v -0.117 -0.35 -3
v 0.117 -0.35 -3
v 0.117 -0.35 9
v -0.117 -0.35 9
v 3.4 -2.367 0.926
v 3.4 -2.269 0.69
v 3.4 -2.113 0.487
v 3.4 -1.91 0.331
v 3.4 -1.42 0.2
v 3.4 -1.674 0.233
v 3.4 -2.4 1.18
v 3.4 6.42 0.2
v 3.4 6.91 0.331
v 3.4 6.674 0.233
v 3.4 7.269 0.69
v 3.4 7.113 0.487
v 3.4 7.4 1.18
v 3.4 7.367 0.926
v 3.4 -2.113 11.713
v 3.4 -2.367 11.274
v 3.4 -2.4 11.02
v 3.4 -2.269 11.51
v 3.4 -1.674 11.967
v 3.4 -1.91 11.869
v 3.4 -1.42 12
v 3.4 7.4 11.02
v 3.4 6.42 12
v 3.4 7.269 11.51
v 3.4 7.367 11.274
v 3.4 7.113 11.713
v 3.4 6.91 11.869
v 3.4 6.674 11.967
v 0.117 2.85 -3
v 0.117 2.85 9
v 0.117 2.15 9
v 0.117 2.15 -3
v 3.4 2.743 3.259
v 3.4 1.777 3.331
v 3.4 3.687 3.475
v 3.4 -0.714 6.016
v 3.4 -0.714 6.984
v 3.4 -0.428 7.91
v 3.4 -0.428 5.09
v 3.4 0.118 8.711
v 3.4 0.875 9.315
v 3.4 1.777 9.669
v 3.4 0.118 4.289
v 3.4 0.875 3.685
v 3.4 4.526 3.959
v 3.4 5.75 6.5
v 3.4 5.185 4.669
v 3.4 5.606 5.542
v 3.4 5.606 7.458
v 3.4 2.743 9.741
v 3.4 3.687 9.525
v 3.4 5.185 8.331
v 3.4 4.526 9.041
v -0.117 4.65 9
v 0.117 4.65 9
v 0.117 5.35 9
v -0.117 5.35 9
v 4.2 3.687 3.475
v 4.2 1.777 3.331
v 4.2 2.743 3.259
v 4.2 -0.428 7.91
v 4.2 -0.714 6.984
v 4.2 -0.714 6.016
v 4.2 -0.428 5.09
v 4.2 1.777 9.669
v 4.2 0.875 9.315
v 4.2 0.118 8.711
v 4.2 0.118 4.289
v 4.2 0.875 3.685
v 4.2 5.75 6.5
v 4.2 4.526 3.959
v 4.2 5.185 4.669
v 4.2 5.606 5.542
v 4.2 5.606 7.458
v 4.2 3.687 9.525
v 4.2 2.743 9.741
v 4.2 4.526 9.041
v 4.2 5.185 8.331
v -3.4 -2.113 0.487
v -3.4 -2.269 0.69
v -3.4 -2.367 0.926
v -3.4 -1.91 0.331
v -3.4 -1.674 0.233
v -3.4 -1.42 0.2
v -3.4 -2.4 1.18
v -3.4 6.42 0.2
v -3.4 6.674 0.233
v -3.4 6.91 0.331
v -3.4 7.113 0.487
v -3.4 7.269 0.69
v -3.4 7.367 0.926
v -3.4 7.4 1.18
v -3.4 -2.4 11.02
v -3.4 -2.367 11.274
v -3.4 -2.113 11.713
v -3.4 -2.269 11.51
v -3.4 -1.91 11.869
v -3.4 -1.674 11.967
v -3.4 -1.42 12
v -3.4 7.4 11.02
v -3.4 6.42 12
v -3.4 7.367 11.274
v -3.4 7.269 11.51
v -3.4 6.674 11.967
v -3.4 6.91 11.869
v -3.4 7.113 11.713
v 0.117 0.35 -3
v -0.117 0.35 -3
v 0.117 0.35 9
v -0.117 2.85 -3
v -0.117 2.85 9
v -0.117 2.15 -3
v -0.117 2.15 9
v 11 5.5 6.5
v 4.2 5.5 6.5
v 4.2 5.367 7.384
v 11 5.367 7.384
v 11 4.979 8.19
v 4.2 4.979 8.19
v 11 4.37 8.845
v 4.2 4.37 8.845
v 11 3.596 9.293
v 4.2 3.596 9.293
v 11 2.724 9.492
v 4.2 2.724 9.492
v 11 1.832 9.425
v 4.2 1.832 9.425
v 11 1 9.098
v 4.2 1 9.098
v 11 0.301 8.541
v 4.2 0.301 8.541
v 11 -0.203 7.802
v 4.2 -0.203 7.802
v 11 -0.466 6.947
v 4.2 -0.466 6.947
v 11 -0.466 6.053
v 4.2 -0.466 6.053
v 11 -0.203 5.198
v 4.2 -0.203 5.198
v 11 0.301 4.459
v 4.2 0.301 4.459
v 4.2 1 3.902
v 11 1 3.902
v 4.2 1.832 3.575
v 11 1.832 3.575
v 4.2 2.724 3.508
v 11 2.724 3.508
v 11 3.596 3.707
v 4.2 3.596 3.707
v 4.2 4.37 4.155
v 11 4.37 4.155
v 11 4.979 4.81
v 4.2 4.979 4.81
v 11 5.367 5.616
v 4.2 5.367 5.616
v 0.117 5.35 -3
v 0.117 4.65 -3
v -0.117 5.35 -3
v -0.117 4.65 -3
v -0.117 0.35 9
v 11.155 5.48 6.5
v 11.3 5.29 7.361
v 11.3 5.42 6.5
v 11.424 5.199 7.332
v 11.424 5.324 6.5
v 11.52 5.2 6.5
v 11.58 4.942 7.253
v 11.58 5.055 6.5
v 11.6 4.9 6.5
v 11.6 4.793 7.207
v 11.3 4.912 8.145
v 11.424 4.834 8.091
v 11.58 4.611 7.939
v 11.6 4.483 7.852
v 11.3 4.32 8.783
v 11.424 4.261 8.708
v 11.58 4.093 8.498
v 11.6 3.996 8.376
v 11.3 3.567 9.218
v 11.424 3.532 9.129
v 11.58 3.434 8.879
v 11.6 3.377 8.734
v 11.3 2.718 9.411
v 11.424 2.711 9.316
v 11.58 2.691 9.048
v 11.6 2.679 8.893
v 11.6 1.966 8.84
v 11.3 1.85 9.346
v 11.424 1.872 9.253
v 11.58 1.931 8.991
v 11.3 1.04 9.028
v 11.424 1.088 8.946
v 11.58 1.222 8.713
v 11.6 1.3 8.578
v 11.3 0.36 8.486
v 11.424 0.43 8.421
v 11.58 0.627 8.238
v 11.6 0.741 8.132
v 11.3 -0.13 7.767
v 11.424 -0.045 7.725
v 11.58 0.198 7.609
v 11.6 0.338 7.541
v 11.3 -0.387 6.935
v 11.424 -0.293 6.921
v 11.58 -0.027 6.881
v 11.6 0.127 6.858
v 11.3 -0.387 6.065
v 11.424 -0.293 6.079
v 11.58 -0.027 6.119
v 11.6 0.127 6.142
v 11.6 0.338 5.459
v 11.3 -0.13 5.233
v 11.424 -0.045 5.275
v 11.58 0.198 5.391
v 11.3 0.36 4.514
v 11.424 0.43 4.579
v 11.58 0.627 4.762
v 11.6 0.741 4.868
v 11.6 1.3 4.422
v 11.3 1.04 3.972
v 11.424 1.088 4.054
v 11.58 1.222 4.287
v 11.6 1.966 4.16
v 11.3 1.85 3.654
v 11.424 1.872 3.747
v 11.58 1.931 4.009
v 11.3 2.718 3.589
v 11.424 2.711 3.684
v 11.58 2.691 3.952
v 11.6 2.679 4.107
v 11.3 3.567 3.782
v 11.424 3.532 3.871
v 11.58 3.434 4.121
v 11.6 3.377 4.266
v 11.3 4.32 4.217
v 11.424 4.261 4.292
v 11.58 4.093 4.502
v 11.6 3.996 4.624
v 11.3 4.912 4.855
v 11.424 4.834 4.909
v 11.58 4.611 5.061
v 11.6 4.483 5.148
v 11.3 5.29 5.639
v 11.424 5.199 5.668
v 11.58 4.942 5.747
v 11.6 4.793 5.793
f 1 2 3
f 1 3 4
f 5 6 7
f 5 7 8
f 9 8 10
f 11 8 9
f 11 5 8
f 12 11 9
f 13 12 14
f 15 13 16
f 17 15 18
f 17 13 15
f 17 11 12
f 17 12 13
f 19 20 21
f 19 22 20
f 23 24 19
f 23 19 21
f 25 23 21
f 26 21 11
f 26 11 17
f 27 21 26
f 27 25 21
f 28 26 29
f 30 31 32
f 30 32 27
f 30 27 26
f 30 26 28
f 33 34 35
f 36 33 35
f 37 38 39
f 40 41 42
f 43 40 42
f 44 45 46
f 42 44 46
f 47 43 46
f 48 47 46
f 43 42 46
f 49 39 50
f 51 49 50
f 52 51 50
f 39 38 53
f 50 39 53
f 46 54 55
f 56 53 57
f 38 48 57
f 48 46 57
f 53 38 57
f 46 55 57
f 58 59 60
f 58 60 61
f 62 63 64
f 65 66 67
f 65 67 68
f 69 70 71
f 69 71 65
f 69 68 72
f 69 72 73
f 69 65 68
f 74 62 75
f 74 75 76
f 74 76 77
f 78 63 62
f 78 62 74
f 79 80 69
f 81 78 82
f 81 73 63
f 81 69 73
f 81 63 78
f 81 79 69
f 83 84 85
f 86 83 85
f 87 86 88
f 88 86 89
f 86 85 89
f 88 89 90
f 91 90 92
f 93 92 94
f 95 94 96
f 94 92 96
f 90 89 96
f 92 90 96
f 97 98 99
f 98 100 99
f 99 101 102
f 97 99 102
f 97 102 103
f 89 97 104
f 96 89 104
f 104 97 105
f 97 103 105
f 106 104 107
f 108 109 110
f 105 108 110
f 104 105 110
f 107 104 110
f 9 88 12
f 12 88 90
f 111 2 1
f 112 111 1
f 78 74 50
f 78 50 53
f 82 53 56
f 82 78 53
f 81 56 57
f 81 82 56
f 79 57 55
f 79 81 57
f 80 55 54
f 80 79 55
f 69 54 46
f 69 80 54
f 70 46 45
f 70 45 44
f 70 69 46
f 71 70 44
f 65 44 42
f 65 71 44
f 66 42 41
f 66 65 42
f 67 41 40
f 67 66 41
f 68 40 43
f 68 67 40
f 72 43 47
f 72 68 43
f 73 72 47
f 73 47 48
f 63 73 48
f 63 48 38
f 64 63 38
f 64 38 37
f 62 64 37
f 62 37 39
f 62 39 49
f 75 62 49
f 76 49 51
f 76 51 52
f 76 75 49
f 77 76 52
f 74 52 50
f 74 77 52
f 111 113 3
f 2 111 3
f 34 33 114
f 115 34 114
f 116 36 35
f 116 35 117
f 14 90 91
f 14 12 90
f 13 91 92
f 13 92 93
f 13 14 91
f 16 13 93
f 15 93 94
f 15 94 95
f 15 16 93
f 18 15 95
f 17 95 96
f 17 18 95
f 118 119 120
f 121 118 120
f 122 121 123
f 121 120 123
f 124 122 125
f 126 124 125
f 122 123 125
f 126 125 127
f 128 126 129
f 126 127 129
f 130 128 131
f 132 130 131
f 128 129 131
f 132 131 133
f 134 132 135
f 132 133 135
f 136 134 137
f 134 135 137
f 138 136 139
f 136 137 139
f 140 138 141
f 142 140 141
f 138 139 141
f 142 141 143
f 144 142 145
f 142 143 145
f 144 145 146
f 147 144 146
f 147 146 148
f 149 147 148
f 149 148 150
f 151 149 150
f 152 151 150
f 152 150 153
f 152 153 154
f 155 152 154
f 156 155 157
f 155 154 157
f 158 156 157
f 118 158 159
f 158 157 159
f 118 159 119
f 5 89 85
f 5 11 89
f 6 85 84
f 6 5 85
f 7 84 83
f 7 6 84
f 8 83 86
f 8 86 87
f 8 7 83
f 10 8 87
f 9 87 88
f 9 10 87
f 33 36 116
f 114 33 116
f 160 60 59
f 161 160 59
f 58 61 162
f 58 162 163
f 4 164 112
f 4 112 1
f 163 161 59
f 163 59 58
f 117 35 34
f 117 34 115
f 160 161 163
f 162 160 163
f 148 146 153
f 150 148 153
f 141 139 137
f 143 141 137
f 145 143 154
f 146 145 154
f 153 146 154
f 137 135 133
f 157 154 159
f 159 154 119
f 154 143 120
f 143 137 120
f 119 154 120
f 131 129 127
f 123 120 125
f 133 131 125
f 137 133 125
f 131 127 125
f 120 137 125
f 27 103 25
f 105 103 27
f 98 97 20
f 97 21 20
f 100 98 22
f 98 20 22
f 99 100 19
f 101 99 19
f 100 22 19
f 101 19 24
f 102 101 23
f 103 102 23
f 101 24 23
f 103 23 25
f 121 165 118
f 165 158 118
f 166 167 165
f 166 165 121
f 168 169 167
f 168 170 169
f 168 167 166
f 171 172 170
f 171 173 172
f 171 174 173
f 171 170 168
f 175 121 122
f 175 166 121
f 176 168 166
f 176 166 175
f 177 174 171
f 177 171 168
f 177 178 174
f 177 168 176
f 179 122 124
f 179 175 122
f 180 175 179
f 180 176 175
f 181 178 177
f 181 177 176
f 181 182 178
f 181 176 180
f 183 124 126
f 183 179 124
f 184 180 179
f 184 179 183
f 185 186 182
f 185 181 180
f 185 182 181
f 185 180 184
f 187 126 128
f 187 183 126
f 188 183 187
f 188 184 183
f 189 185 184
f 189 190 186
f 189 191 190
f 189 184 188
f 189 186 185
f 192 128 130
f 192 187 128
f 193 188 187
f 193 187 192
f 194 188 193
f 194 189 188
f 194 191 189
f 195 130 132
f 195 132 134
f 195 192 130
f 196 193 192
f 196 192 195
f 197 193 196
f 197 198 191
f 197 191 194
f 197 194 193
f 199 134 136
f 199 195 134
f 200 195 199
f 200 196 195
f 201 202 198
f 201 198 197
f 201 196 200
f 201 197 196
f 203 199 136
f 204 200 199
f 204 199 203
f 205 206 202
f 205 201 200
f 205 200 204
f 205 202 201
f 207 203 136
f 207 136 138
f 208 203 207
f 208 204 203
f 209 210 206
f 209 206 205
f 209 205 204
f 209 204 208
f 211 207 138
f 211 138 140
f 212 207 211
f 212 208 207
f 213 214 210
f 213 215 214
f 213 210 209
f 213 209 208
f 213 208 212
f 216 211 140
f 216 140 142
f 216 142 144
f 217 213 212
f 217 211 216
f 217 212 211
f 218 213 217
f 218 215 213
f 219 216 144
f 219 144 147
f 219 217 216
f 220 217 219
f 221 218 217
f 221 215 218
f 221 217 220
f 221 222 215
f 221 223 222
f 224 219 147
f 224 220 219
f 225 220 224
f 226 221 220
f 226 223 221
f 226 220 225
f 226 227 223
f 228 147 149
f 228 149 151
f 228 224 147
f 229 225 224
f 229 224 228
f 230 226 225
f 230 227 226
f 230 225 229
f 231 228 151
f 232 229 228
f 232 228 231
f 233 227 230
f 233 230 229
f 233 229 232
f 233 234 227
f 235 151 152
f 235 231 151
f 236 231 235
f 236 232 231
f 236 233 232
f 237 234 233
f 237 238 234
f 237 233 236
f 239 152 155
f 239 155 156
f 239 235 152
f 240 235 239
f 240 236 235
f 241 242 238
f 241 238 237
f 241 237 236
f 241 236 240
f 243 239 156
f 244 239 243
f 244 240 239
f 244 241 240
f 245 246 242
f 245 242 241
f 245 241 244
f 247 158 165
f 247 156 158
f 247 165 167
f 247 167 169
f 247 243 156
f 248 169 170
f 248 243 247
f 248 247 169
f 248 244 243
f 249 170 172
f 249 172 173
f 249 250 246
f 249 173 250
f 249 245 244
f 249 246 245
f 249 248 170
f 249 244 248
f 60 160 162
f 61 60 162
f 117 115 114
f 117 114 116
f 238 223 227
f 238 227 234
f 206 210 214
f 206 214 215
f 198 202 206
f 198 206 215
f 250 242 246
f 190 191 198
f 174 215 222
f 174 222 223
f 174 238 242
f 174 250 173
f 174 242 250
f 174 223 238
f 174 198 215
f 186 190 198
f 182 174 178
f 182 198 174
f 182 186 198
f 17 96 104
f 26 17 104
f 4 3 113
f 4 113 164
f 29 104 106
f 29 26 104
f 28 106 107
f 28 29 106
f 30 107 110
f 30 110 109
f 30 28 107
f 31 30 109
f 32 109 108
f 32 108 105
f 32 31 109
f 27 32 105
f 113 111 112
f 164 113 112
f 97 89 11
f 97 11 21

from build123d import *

# Parameters (mm, degrees)
SKETCH001_R       = 3.25
PAD001_DEPTH      = 0.8
SKETCH003_W       = 0.233334
SKETCH003_H       = 0.7
PAD002_DEPTH      = 9
PAD002_DEPTH_BACK = 3
SKETCH004_R       = 3
PAD003_DEPTH      = 7.4
FILLET_R          = 0.6
SKETCH_W          = 9.8
SKETCH_H          = 11.8
PAD_DEPTH         = 6.8
FILLET001_R       = 0.98


with BuildPart() as pad001:
    # Sketch001 → Pad001 (new body)
    with BuildSketch(Plane.YZ.offset(4.2)):
        with Locations((2.5, 6.5)):
            Circle(SKETCH001_R)
    extrude(amount=-PAD001_DEPTH)


with BuildPart() as pad002:
    # Sketch003 → Pad002 (new body, two sides)
    with BuildSketch(Plane(origin=(0, 0, 0), x_dir=(-1, 0, 0), z_dir=(0, 0, 1))) as pad002_sk:
        Rectangle(SKETCH003_W, SKETCH003_H)
        with Locations((0, -2.5)):
            Rectangle(SKETCH003_W, SKETCH003_H)
        with Locations((0, -5)):
            Rectangle(SKETCH003_W, SKETCH003_H)
    extrude(amount=PAD002_DEPTH)
    extrude(pad002_sk.sketch, amount=-PAD002_DEPTH_BACK)


with BuildPart() as fillet_body:
    # Sketch004 → Pad003 (new body)
    with BuildSketch(Plane.YZ.offset(4.2)):
        with Locations((2.5, 6.5)):
            Circle(SKETCH004_R)
    extrude(amount=PAD003_DEPTH)

    # Fillet
    fillet_edges = [fillet_body.edges().sort_by_distance(p)[0] for p in [
        (11.6, -0.5, 6.5),
    ]]
    fillet(fillet_edges, radius=FILLET_R)


with BuildPart() as fillet001:
    # Sketch → Pad (new body)
    with BuildSketch(Plane.YZ.offset(-3.4)):
        with Locations((2.5, 6.1)):
            Rectangle(SKETCH_W, SKETCH_H)
    extrude(amount=PAD_DEPTH)

    # Fillet001
    fillet001_edges = [fillet001.edges().sort_by_distance(p)[0] for p in [
        (0, -2.4, 12),
        (0, 7.4, 12),
        (0, -2.4, 0.2),
        (0, 7.4, 0.2),
    ]]
    fillet(fillet001_edges, radius=FILLET001_R)


solid = Compound([pad001.part, pad002.part, fillet_body.part, fillet001.part])
